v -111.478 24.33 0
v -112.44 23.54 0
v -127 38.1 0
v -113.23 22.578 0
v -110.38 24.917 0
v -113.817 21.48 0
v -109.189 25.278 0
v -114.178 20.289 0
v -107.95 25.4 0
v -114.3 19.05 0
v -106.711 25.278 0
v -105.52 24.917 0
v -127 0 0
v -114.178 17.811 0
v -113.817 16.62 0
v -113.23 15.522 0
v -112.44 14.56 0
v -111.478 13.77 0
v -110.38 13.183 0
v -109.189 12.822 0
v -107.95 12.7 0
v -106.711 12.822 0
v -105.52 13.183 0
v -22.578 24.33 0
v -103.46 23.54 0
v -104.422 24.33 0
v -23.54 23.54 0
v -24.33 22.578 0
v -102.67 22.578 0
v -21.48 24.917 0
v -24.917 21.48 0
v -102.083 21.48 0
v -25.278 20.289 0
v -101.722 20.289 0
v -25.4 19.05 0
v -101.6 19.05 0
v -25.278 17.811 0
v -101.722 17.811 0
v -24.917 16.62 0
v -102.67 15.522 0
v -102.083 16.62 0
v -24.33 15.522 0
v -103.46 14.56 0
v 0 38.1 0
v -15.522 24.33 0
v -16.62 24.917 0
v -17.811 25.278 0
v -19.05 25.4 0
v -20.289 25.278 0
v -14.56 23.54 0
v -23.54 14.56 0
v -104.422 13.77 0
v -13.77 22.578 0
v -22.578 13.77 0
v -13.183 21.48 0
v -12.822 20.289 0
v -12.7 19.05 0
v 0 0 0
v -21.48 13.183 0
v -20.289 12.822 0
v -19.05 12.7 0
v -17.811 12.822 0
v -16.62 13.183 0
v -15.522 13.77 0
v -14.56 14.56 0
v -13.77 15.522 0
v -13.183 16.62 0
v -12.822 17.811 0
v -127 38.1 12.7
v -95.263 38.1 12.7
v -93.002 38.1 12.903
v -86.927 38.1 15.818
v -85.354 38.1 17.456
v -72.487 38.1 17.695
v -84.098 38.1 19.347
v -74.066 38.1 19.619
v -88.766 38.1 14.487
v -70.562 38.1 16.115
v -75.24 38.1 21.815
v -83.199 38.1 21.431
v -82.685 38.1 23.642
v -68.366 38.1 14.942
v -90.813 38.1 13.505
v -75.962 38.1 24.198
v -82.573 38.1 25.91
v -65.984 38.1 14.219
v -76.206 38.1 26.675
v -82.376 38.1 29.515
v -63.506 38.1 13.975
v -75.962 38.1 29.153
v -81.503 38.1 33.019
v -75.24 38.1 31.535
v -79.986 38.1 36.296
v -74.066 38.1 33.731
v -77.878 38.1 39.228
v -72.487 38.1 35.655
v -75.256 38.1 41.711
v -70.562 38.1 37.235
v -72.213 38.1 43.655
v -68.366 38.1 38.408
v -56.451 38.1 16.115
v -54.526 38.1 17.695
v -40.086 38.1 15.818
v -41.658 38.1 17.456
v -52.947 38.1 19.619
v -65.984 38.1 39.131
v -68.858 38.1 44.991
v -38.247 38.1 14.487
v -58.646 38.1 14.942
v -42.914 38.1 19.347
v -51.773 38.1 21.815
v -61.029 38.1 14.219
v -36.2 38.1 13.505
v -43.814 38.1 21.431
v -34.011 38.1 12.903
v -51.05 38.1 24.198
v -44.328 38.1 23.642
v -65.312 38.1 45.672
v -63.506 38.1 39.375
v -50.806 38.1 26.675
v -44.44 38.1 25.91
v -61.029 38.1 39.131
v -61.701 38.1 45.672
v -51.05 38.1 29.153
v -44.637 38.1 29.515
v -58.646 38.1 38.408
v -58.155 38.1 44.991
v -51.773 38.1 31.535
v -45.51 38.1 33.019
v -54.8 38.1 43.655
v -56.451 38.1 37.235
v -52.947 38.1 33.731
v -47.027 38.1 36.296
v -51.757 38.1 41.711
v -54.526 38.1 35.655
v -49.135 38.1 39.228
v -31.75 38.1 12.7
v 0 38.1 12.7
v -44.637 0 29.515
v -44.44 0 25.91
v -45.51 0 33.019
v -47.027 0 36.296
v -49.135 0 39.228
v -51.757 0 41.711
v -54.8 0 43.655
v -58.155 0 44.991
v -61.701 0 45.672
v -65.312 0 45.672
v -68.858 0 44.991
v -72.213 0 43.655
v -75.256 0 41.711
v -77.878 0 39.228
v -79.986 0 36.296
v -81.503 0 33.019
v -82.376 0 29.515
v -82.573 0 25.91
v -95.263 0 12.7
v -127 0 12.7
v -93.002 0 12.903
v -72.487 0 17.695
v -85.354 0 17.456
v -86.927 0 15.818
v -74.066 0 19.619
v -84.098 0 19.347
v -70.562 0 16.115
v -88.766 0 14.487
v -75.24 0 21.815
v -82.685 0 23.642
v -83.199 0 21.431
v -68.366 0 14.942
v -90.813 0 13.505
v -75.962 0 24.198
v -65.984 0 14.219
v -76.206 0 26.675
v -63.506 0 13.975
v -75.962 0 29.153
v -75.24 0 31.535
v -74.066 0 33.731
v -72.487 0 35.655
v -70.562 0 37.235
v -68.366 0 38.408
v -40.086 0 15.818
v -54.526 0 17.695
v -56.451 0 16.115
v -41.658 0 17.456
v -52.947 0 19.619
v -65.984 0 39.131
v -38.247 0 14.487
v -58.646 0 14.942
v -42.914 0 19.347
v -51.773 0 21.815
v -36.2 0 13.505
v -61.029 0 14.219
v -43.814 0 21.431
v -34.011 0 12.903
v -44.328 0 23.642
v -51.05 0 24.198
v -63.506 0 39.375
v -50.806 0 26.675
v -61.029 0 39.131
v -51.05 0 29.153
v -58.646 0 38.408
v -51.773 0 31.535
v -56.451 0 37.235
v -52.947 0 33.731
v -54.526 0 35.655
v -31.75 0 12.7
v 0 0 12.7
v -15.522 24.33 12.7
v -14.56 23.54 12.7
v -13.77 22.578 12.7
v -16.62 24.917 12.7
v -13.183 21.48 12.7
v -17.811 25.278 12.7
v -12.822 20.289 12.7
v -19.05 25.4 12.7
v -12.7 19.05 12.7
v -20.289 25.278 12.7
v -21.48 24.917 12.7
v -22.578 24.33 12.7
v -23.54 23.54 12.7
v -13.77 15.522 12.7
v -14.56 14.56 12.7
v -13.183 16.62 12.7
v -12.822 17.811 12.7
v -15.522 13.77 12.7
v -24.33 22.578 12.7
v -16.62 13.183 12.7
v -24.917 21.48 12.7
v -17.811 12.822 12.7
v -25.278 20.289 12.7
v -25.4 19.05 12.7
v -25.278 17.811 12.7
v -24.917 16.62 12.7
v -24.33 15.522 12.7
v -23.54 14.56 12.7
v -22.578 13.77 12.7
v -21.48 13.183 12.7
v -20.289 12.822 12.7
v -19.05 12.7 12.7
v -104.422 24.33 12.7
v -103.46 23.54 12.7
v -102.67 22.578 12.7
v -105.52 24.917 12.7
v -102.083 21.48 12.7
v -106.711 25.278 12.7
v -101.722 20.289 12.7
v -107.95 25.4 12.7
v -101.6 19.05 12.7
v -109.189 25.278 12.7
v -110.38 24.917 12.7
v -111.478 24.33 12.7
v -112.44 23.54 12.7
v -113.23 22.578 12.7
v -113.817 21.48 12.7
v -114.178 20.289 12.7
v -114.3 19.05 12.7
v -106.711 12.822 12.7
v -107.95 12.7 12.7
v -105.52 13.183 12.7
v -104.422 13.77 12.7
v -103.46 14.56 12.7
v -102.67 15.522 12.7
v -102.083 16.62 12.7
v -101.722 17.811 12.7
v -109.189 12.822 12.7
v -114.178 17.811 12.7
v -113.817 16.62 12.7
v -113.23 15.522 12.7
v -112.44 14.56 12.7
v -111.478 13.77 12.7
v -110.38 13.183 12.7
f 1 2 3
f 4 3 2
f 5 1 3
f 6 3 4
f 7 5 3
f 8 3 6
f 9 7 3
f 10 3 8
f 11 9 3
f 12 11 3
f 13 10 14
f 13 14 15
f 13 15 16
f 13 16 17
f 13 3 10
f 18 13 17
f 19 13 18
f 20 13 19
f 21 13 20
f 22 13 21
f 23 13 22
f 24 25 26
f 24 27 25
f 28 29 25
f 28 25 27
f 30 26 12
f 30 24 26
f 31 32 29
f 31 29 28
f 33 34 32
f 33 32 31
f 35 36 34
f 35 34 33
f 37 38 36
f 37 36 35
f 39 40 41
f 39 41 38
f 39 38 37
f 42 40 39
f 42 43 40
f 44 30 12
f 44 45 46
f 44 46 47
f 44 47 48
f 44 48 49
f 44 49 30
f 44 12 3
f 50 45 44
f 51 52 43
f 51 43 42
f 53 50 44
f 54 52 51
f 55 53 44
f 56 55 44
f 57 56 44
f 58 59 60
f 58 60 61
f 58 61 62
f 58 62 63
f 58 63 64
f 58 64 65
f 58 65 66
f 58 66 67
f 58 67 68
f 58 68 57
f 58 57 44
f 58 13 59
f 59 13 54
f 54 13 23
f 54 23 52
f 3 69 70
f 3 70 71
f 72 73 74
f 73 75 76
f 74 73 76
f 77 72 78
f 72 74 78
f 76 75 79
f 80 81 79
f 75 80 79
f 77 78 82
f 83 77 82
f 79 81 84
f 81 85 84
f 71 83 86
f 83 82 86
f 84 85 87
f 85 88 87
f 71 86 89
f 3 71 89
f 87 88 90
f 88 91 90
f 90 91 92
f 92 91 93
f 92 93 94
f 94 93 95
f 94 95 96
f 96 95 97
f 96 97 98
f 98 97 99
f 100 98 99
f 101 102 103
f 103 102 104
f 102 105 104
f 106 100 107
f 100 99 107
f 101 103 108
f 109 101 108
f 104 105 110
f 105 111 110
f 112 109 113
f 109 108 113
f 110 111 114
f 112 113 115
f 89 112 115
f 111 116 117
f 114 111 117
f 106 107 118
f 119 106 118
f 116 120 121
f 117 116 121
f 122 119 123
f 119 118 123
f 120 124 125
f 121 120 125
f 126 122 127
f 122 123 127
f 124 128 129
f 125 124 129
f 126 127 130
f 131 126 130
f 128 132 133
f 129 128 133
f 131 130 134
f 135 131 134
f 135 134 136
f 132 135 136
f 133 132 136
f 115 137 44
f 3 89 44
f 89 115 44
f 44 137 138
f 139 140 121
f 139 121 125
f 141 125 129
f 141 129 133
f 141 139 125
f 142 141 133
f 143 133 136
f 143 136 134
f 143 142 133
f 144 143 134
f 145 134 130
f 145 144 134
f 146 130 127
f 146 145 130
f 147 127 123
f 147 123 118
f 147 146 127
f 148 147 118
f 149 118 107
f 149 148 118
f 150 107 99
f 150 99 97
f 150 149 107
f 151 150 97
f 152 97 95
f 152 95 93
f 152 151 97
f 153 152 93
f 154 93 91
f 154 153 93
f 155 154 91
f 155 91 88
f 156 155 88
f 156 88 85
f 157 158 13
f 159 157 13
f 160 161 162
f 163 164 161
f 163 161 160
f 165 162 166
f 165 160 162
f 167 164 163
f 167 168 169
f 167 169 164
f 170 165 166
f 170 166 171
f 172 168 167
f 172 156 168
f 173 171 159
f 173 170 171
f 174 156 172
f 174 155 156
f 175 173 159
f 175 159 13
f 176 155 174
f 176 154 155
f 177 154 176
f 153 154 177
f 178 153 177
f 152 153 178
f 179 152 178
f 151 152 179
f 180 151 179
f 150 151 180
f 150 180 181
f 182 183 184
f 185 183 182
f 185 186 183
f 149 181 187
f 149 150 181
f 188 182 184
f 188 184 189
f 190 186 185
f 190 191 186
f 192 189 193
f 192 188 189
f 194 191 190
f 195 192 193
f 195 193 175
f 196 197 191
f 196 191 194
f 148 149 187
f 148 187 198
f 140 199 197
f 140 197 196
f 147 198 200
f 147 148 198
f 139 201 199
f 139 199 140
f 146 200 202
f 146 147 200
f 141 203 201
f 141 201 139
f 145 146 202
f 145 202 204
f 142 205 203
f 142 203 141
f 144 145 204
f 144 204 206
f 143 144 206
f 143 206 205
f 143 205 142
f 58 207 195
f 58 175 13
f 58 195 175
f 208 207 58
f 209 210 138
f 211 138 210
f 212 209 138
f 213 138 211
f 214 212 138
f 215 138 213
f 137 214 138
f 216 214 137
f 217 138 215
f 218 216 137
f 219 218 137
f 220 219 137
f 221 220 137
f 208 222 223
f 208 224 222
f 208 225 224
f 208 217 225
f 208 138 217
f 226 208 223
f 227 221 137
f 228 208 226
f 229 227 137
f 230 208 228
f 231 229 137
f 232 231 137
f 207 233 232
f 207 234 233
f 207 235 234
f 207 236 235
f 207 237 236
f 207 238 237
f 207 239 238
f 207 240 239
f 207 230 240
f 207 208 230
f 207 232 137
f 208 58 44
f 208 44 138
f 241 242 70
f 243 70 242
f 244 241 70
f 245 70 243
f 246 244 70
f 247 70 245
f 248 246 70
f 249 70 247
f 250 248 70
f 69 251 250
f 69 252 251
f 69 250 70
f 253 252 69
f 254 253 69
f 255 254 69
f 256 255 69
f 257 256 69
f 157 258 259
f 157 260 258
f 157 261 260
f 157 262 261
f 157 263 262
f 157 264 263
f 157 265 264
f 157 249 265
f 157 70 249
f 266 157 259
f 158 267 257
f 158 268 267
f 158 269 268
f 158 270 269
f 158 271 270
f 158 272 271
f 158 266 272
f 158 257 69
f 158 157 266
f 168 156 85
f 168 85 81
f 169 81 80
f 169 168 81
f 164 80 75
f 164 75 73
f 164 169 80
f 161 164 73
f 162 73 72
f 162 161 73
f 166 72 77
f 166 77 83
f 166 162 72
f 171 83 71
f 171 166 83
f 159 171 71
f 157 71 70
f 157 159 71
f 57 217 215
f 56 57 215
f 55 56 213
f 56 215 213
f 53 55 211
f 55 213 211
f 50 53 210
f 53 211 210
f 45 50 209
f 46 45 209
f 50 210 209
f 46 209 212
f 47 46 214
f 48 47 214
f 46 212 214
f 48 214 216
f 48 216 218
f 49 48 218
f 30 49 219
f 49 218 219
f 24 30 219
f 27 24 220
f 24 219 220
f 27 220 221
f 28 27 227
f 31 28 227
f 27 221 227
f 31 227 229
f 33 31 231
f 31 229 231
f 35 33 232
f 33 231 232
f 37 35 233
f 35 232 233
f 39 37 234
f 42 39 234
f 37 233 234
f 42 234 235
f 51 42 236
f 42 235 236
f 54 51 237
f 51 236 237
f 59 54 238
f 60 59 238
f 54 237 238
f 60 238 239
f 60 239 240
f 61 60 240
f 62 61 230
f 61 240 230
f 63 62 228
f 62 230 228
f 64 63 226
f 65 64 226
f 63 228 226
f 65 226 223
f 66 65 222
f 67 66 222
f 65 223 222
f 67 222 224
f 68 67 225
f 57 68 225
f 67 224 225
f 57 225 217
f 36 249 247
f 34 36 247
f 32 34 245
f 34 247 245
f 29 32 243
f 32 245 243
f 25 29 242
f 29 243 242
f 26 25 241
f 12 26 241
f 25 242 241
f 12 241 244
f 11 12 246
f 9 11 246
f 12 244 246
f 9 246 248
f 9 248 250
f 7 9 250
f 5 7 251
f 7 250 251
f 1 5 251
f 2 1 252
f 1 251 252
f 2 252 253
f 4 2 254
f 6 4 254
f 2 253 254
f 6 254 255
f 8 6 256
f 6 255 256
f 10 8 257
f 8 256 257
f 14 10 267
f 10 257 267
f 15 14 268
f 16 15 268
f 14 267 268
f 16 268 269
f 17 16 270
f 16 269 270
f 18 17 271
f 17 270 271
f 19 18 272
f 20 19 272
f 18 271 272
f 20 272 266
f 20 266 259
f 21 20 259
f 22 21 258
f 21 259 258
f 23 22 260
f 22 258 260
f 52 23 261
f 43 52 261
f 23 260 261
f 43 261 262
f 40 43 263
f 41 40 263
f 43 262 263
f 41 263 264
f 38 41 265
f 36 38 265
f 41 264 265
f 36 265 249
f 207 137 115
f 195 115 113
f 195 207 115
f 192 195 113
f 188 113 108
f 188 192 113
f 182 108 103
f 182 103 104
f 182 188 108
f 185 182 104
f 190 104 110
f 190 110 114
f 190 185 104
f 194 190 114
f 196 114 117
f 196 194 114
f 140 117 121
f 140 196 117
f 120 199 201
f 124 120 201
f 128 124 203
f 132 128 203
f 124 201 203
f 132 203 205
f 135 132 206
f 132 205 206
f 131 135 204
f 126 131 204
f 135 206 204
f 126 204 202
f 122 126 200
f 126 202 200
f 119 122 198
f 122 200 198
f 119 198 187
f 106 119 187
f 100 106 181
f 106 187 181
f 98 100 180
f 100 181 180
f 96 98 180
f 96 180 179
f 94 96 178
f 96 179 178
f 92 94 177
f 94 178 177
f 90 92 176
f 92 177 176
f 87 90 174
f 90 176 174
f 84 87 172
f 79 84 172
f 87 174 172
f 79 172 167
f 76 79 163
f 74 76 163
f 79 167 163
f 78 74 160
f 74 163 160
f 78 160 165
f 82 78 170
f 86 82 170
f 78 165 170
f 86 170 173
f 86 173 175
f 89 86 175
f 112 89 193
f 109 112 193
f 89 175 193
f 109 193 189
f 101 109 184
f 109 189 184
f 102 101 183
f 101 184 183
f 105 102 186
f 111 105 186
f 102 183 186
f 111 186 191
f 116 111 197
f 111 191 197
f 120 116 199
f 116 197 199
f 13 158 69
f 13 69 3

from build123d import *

# Parameters (mm, degrees)
F0_R     = 12.7
F1_DEPTH = 38.1
F2_R     = 6.35
F3_R     = 6.35
F4_DEPTH = 12.7


with BuildPart() as f1:
    # F0 (on Front) → F1 (new body)
    with BuildSketch(Plane.XZ):
        with BuildLine():
            Line((-127, 0), (0, 0))
            Line((0, 0), (0, 12.7))
            Line((0, 12.7), (-31.75, 12.7))
            ThreePointArc((-31.75, 12.7), (-40.908636, 16.60174), (-44.439774, 25.909547))
            ThreePointArc((-44.439774, 25.909547), (-63.506386, 45.757127), (-82.572999, 25.909547))
            ThreePointArc((-82.572999, 25.909547), (-86.104136, 16.60174), (-95.262773, 12.7))
            Line((-95.262773, 12.7), (-127, 12.7))
            Line((-127, 12.7), (-127, 0))
        make_face()
        with Locations((-63.506386, 26.67515)):
            Circle(F0_R, mode=Mode.SUBTRACT)
    extrude(amount=-F1_DEPTH)

    # F2 (on face) + F3 (on face) → F4 (cut)
    with BuildSketch(Plane.XY.offset(12.7)):
        with Locations((-19.05, 19.05)):
            Circle(F2_R)
    with BuildSketch(Plane.XY.offset(12.7)):
        with Locations((-107.95, 19.05)):
            Circle(F3_R)
    extrude(amount=-F4_DEPTH, mode=Mode.SUBTRACT)


solid = f1.part
